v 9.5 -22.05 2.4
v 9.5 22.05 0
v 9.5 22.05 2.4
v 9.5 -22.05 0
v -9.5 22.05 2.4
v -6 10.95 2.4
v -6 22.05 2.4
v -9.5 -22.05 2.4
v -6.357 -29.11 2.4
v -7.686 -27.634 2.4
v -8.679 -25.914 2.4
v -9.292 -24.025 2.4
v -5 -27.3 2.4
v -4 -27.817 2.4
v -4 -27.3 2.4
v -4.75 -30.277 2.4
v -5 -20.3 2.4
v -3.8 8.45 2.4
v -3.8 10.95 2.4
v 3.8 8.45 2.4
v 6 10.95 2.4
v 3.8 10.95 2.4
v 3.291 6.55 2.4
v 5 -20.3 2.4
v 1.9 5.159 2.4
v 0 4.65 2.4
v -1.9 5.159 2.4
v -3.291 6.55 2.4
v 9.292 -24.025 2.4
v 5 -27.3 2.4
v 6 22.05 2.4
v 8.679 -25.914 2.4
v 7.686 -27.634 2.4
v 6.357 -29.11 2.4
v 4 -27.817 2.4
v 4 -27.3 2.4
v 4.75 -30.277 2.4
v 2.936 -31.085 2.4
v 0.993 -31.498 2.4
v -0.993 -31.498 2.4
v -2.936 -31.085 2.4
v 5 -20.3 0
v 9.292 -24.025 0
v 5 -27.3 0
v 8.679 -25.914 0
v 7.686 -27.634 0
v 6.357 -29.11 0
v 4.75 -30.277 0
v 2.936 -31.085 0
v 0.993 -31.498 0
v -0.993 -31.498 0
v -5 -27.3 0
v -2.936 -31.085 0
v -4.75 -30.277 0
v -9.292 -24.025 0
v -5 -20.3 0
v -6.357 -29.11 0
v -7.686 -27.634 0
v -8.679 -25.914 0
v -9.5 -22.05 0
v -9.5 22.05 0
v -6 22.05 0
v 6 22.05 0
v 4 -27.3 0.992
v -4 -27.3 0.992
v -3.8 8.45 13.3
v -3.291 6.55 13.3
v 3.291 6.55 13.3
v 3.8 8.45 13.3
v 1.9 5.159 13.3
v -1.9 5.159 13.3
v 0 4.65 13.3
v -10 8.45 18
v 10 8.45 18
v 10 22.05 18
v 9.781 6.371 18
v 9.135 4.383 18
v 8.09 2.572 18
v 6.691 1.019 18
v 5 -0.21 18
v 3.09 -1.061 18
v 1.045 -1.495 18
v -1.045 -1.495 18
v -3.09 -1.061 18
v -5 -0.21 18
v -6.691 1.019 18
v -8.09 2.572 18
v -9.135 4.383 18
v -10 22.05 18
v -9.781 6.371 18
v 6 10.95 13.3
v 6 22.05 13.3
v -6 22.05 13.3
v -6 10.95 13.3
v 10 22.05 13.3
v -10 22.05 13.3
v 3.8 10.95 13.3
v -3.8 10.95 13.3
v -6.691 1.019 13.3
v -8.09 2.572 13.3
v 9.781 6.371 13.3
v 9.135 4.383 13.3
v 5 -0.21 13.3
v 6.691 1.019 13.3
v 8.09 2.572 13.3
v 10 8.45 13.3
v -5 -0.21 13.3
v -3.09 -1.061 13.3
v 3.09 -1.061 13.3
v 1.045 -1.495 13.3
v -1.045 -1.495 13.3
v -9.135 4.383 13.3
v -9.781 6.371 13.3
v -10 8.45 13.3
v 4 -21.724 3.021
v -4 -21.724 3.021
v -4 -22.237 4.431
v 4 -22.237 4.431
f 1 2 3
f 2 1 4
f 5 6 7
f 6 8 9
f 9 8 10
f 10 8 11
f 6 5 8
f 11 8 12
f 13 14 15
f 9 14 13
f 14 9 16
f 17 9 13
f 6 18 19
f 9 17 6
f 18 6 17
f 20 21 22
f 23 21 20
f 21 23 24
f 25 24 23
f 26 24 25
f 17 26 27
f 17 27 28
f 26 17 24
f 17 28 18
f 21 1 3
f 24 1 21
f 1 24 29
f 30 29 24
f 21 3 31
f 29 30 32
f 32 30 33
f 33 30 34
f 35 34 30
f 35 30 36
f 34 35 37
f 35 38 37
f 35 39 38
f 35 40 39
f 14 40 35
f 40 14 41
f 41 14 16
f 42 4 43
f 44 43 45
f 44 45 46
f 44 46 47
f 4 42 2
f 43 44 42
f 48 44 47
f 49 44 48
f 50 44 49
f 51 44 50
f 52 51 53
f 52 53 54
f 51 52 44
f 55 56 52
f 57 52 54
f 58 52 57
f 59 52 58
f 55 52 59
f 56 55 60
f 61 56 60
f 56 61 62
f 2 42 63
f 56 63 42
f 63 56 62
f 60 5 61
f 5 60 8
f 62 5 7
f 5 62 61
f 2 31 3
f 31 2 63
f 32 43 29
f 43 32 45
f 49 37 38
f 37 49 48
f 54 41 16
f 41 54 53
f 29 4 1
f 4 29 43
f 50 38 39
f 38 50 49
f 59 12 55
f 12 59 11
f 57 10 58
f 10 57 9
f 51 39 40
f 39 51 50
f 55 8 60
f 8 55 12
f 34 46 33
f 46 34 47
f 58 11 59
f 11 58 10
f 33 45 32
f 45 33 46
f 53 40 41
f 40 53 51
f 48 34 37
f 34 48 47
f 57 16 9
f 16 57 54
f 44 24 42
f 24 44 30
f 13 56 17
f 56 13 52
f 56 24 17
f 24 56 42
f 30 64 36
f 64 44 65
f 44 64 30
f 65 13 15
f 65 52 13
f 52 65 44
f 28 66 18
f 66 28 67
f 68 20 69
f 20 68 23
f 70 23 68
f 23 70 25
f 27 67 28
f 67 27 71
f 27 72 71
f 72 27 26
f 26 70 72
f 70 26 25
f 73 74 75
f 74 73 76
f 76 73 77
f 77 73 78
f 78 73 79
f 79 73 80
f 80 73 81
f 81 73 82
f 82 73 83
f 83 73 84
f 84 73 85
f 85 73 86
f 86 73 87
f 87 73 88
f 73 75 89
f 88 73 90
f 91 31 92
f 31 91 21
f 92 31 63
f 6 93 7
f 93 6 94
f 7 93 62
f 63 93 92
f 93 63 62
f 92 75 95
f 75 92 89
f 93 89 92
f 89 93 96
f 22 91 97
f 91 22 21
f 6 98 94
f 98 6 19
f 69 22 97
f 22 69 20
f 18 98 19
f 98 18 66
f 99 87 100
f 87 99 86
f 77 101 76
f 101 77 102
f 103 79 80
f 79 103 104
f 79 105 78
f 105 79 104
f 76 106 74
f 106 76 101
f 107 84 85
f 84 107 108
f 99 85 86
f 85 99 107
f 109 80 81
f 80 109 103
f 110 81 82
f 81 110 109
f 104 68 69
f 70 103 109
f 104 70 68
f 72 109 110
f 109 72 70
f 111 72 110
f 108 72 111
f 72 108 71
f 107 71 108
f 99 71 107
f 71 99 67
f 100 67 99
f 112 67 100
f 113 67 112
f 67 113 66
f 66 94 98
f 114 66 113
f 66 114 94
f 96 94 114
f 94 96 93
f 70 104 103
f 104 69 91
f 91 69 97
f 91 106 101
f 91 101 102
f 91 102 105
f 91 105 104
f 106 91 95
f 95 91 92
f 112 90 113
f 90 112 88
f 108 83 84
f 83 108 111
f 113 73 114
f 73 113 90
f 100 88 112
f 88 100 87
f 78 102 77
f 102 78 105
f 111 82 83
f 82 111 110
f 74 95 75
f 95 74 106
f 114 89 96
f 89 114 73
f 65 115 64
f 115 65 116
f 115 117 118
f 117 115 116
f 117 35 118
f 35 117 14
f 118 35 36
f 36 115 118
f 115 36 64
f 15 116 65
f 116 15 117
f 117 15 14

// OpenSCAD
gp_breite = 19;
gp_hoehe = 2.4;
stift_radius = 3.8;
stift_rand = gp_breite/2+0.5;//10;
stift_hoehe = 18;
rand_hoehe = 4.7;
schlitz_breite = 1.6;
schlitz_tiefe = 10;
unendlich = 1000;
loch_breite = 7;
loch_laenge = 10;
stuetze_hoehe = stift_hoehe;
stuetze_laenge = 2*stift_radius+6;
stuetze_breite = 12;
stuetze_d1 = 2.5;
gp_laenge = stuetze_laenge+40;


union() {

// Grundplatte
    difference() {
        union() {
            // grundplatte rechteckig
            translate([0,0,gp_hoehe/2]) 
                cube([gp_breite,gp_laenge-gp_breite/2,gp_hoehe], true);

            // grundplatte rund
            translate([ 00, -(gp_laenge-gp_breite/2)/2, 00]) 
                cylinder(h=gp_hoehe, r1=gp_breite/2, r2=gp_breite/2); 
        }

        // loch für noppe
        translate([0,-gp_laenge/2+3,0]) 
            cube([loch_laenge, loch_breite, unendlich],true);
    }

// stift
    translate([ 0, (gp_laenge-gp_breite/2)/2-stuetze_laenge, 0])
    difference (){
        union() {
            // stift
            cylinder(h=stift_hoehe, r1=stift_radius, r2=stift_radius);

            // stuetze
            translate([ 0, (stuetze_laenge+stuetze_d1)/2, (stuetze_hoehe)/2]) 
                cube([stuetze_breite, stuetze_laenge-stuetze_d1, stuetze_hoehe], true);
            translate([ 0, (stuetze_laenge)/2, (stuetze_hoehe)/2])
                cube([2*stift_radius, stuetze_laenge, stuetze_hoehe], true);

            // rand
//            hull() {
//            translate([ 0, 0, stift_hoehe-rand_hoehe])
//                cylinder(h=rand_hoehe, r1=stift_rand, r2=stift_rand);
//            translate([ 0, 4, stift_hoehe-rand_hoehe])
//                cylinder(h=rand_hoehe, r1=stift_rand, r2=stift_rand);
//                }
            translate([ 0, 0, stift_hoehe-rand_hoehe])
                cylinder(h=rand_hoehe, r1=stift_rand, r2=stift_rand);
            translate([ 0, stuetze_laenge/2, stift_hoehe-rand_hoehe+rand_hoehe/2]) 
                cube([2*stift_rand, stuetze_laenge, rand_hoehe], true);
        }
    }

    //noppe
    translate([0, -gp_laenge/2+2, gp_hoehe+0.3]) 
        rotate([20, 0, 0]) 
            cube([loch_laenge*0.8, 6, 1.5],true);

}
